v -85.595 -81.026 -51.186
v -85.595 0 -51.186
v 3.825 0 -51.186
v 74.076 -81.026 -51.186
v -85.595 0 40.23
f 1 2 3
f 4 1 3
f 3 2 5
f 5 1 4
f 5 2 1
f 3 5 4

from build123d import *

# Parameters (mm, degrees)
F0_W     = 159.6704572439
F0_H     = 91.4154052735
F1_DEPTH = 81.026
F3_DEPTH = 159.6714572439
F5_DEPTH = 60.6369841733


with BuildPart() as f1:
    # F0 (on Front) → F1 (new body)
    with BuildSketch(Plane.XZ):
        with Locations((-5.7597234845, -5.4780766368)):
            Rectangle(F0_W, F0_H)
    extrude(amount=F1_DEPTH)

    # F2 (on face) → F3 (cut, through all)
    with BuildSketch(Plane.YZ.offset(74.0755051374)):
        Polygon((-81.026, -51.1857792735), (0, 40.229626), (-81.026, 40.229626), align=None)
    extrude(amount=-F3_DEPTH, mode=Mode.SUBTRACT)

    # F4 (on face) → F5 (cut, through all)
    with BuildSketch(Plane(origin=(0, -19.9693104316, 17.699788588), x_dir=(1, 0, 0), z_dir=(0, -0.7483521854, 0.6633015955))):
        Polygon((74.0755051374, 30.1059285345), (-85.5949521065, 30.1059285345), (74.0755051374, -92.049664859), align=None)
    extrude(amount=-F5_DEPTH, mode=Mode.SUBTRACT)


solid = f1.part
